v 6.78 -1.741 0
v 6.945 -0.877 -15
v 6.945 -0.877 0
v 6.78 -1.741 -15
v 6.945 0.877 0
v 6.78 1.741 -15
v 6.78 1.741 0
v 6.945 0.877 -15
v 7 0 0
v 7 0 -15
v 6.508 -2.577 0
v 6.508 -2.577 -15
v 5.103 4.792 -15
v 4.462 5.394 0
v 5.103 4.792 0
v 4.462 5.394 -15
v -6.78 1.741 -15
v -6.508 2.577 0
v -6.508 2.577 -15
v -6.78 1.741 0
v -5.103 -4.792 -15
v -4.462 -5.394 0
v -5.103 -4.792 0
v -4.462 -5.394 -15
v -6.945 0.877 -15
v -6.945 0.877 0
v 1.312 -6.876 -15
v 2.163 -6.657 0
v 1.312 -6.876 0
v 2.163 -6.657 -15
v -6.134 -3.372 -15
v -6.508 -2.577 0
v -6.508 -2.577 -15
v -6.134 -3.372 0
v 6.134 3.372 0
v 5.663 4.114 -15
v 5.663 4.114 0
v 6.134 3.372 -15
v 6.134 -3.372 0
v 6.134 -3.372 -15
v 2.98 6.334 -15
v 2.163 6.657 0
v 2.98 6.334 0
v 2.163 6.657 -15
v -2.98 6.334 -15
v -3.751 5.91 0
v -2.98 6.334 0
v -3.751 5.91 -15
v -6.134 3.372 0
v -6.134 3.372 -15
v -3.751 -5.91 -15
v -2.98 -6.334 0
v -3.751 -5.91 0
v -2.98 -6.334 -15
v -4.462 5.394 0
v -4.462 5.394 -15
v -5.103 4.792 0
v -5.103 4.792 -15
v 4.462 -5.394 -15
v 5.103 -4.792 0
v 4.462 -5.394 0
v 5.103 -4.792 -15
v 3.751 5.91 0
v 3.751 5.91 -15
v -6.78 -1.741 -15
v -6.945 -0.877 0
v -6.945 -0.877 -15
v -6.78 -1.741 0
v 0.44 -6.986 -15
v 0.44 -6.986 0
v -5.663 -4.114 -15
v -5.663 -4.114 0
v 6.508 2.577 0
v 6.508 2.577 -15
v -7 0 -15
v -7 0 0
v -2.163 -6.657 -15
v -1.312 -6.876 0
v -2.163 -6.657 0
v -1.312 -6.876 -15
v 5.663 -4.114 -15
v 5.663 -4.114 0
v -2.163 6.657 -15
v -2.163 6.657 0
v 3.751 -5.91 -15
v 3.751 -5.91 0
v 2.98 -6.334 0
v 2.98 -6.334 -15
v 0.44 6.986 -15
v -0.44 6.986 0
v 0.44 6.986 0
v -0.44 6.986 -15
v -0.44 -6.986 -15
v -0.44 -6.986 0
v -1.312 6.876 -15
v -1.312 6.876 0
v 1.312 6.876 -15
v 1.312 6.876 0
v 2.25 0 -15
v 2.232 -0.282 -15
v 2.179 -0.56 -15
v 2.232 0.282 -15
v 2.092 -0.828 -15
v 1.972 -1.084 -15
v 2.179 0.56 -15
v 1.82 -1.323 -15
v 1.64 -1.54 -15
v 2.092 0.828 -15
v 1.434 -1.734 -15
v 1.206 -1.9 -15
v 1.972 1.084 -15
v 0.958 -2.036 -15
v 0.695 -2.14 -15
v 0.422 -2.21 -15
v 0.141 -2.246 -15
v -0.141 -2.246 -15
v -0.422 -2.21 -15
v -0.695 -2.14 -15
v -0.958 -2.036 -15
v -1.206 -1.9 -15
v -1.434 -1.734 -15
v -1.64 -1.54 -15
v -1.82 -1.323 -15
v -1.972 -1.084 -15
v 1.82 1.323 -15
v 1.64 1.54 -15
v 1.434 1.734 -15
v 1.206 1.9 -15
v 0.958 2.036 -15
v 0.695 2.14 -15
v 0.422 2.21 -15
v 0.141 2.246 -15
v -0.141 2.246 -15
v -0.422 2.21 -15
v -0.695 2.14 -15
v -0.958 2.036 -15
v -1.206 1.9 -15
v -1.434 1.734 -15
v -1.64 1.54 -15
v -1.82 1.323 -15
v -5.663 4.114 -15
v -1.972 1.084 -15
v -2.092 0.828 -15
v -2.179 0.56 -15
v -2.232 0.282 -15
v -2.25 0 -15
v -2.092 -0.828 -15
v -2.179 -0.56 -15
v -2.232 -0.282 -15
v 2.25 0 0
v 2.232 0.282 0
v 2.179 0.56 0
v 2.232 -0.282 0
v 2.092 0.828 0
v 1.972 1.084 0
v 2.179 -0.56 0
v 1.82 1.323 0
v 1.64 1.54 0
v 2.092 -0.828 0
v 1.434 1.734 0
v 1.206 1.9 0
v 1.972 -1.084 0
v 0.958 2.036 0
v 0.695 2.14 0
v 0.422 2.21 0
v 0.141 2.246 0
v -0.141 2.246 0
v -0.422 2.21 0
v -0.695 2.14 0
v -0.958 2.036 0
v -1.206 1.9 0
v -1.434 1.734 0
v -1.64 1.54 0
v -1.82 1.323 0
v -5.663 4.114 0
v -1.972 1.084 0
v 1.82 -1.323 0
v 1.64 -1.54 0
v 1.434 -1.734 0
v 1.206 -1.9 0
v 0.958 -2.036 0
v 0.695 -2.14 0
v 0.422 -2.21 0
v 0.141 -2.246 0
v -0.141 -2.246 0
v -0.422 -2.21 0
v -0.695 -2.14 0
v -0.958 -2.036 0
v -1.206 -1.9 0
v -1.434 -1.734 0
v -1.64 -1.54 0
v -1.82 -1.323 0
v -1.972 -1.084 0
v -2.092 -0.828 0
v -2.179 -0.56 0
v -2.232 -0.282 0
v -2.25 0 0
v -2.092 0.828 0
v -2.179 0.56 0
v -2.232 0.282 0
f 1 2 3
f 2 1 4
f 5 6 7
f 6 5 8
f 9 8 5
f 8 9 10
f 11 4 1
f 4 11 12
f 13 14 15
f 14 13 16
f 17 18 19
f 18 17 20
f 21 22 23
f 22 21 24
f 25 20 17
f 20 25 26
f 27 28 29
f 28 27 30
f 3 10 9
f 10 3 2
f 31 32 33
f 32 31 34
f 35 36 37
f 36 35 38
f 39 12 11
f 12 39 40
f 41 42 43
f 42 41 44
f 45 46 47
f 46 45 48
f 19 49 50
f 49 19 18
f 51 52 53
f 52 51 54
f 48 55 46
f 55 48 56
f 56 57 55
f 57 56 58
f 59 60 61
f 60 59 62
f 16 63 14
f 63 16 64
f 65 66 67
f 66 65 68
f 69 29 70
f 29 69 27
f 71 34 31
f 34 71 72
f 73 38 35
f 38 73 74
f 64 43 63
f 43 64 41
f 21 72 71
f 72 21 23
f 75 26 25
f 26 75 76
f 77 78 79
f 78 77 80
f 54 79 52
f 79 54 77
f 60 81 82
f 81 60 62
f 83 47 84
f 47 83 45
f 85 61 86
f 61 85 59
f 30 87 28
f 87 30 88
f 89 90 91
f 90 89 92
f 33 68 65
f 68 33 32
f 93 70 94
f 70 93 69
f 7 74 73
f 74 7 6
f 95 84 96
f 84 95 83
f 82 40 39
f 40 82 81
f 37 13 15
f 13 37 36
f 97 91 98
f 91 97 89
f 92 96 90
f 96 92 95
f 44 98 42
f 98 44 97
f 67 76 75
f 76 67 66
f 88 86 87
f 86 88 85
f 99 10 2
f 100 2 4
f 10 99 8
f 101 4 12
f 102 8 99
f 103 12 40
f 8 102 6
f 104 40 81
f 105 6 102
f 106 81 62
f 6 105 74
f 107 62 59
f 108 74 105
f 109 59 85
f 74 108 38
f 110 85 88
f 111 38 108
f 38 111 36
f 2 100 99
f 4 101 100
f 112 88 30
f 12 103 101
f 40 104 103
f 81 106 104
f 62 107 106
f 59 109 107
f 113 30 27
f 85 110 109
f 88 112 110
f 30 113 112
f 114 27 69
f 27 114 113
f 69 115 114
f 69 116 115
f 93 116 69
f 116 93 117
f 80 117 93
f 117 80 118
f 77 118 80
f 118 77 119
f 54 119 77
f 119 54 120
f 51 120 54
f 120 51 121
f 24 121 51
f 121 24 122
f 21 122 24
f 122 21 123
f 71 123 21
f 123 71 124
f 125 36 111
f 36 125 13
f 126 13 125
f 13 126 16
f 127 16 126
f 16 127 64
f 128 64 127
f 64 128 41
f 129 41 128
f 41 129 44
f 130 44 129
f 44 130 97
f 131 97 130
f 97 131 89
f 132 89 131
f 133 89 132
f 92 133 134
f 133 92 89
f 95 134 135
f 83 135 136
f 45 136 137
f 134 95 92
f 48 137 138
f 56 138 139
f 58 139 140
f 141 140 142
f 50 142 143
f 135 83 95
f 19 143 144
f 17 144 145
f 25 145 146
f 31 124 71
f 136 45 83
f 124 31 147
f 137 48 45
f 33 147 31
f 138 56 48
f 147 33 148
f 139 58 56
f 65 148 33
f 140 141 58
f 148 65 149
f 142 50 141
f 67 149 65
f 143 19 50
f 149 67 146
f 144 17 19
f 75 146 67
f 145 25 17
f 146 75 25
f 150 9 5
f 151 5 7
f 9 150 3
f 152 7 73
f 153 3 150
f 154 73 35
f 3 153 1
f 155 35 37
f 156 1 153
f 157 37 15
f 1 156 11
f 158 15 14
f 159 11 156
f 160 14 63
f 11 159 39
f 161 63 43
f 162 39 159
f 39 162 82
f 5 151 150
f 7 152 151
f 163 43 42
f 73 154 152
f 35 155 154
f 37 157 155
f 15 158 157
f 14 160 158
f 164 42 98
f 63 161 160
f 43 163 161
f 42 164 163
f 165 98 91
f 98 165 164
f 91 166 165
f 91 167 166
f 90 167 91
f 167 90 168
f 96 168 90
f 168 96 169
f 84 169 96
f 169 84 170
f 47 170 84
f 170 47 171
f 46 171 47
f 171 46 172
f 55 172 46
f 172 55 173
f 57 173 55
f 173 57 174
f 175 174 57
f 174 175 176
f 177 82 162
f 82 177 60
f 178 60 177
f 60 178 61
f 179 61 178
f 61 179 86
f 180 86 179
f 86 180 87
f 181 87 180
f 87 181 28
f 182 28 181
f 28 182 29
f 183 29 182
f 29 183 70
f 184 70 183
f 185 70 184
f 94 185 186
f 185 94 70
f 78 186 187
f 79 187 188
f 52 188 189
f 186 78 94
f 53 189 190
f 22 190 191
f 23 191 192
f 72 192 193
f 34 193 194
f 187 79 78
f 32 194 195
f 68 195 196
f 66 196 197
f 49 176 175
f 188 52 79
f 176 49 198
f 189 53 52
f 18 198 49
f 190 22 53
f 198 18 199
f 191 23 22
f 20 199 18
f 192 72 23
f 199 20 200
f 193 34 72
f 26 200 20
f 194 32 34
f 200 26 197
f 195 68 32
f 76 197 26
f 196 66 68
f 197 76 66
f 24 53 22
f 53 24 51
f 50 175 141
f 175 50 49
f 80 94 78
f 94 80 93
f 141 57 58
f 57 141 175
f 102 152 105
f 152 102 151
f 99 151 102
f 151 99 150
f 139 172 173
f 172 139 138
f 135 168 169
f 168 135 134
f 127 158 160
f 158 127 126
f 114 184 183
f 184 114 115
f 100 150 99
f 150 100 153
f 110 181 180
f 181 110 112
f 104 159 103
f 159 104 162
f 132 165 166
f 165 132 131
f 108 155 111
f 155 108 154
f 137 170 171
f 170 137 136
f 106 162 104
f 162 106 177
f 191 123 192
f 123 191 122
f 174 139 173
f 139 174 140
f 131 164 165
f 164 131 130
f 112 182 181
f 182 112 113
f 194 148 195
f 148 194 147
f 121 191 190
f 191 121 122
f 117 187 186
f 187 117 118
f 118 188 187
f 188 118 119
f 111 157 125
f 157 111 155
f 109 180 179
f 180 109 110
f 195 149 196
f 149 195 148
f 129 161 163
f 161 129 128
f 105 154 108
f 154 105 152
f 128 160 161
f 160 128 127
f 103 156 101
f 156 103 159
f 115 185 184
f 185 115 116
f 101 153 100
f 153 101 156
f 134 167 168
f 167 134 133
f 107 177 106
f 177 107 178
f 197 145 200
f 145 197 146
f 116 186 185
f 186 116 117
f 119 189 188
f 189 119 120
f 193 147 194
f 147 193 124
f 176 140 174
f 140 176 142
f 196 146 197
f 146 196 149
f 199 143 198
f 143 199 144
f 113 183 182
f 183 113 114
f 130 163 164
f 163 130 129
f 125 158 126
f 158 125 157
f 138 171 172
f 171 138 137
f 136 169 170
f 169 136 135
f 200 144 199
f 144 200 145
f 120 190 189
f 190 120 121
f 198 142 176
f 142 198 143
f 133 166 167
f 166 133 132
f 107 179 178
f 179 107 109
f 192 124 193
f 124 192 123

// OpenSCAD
$fn = 50;


difference() {
	union() {
		translate(v = [0, 0, -15.0000000000]) {
			cylinder(h = 15, r = 7.0000000000);
		}
		cylinder(h = 0, r = 16.0000000000);
	}
	union() {
		#translate(v = [0, 0, -15]) {
			cylinder(h = 15, r = 2.2500000000);
		}
	}
}
